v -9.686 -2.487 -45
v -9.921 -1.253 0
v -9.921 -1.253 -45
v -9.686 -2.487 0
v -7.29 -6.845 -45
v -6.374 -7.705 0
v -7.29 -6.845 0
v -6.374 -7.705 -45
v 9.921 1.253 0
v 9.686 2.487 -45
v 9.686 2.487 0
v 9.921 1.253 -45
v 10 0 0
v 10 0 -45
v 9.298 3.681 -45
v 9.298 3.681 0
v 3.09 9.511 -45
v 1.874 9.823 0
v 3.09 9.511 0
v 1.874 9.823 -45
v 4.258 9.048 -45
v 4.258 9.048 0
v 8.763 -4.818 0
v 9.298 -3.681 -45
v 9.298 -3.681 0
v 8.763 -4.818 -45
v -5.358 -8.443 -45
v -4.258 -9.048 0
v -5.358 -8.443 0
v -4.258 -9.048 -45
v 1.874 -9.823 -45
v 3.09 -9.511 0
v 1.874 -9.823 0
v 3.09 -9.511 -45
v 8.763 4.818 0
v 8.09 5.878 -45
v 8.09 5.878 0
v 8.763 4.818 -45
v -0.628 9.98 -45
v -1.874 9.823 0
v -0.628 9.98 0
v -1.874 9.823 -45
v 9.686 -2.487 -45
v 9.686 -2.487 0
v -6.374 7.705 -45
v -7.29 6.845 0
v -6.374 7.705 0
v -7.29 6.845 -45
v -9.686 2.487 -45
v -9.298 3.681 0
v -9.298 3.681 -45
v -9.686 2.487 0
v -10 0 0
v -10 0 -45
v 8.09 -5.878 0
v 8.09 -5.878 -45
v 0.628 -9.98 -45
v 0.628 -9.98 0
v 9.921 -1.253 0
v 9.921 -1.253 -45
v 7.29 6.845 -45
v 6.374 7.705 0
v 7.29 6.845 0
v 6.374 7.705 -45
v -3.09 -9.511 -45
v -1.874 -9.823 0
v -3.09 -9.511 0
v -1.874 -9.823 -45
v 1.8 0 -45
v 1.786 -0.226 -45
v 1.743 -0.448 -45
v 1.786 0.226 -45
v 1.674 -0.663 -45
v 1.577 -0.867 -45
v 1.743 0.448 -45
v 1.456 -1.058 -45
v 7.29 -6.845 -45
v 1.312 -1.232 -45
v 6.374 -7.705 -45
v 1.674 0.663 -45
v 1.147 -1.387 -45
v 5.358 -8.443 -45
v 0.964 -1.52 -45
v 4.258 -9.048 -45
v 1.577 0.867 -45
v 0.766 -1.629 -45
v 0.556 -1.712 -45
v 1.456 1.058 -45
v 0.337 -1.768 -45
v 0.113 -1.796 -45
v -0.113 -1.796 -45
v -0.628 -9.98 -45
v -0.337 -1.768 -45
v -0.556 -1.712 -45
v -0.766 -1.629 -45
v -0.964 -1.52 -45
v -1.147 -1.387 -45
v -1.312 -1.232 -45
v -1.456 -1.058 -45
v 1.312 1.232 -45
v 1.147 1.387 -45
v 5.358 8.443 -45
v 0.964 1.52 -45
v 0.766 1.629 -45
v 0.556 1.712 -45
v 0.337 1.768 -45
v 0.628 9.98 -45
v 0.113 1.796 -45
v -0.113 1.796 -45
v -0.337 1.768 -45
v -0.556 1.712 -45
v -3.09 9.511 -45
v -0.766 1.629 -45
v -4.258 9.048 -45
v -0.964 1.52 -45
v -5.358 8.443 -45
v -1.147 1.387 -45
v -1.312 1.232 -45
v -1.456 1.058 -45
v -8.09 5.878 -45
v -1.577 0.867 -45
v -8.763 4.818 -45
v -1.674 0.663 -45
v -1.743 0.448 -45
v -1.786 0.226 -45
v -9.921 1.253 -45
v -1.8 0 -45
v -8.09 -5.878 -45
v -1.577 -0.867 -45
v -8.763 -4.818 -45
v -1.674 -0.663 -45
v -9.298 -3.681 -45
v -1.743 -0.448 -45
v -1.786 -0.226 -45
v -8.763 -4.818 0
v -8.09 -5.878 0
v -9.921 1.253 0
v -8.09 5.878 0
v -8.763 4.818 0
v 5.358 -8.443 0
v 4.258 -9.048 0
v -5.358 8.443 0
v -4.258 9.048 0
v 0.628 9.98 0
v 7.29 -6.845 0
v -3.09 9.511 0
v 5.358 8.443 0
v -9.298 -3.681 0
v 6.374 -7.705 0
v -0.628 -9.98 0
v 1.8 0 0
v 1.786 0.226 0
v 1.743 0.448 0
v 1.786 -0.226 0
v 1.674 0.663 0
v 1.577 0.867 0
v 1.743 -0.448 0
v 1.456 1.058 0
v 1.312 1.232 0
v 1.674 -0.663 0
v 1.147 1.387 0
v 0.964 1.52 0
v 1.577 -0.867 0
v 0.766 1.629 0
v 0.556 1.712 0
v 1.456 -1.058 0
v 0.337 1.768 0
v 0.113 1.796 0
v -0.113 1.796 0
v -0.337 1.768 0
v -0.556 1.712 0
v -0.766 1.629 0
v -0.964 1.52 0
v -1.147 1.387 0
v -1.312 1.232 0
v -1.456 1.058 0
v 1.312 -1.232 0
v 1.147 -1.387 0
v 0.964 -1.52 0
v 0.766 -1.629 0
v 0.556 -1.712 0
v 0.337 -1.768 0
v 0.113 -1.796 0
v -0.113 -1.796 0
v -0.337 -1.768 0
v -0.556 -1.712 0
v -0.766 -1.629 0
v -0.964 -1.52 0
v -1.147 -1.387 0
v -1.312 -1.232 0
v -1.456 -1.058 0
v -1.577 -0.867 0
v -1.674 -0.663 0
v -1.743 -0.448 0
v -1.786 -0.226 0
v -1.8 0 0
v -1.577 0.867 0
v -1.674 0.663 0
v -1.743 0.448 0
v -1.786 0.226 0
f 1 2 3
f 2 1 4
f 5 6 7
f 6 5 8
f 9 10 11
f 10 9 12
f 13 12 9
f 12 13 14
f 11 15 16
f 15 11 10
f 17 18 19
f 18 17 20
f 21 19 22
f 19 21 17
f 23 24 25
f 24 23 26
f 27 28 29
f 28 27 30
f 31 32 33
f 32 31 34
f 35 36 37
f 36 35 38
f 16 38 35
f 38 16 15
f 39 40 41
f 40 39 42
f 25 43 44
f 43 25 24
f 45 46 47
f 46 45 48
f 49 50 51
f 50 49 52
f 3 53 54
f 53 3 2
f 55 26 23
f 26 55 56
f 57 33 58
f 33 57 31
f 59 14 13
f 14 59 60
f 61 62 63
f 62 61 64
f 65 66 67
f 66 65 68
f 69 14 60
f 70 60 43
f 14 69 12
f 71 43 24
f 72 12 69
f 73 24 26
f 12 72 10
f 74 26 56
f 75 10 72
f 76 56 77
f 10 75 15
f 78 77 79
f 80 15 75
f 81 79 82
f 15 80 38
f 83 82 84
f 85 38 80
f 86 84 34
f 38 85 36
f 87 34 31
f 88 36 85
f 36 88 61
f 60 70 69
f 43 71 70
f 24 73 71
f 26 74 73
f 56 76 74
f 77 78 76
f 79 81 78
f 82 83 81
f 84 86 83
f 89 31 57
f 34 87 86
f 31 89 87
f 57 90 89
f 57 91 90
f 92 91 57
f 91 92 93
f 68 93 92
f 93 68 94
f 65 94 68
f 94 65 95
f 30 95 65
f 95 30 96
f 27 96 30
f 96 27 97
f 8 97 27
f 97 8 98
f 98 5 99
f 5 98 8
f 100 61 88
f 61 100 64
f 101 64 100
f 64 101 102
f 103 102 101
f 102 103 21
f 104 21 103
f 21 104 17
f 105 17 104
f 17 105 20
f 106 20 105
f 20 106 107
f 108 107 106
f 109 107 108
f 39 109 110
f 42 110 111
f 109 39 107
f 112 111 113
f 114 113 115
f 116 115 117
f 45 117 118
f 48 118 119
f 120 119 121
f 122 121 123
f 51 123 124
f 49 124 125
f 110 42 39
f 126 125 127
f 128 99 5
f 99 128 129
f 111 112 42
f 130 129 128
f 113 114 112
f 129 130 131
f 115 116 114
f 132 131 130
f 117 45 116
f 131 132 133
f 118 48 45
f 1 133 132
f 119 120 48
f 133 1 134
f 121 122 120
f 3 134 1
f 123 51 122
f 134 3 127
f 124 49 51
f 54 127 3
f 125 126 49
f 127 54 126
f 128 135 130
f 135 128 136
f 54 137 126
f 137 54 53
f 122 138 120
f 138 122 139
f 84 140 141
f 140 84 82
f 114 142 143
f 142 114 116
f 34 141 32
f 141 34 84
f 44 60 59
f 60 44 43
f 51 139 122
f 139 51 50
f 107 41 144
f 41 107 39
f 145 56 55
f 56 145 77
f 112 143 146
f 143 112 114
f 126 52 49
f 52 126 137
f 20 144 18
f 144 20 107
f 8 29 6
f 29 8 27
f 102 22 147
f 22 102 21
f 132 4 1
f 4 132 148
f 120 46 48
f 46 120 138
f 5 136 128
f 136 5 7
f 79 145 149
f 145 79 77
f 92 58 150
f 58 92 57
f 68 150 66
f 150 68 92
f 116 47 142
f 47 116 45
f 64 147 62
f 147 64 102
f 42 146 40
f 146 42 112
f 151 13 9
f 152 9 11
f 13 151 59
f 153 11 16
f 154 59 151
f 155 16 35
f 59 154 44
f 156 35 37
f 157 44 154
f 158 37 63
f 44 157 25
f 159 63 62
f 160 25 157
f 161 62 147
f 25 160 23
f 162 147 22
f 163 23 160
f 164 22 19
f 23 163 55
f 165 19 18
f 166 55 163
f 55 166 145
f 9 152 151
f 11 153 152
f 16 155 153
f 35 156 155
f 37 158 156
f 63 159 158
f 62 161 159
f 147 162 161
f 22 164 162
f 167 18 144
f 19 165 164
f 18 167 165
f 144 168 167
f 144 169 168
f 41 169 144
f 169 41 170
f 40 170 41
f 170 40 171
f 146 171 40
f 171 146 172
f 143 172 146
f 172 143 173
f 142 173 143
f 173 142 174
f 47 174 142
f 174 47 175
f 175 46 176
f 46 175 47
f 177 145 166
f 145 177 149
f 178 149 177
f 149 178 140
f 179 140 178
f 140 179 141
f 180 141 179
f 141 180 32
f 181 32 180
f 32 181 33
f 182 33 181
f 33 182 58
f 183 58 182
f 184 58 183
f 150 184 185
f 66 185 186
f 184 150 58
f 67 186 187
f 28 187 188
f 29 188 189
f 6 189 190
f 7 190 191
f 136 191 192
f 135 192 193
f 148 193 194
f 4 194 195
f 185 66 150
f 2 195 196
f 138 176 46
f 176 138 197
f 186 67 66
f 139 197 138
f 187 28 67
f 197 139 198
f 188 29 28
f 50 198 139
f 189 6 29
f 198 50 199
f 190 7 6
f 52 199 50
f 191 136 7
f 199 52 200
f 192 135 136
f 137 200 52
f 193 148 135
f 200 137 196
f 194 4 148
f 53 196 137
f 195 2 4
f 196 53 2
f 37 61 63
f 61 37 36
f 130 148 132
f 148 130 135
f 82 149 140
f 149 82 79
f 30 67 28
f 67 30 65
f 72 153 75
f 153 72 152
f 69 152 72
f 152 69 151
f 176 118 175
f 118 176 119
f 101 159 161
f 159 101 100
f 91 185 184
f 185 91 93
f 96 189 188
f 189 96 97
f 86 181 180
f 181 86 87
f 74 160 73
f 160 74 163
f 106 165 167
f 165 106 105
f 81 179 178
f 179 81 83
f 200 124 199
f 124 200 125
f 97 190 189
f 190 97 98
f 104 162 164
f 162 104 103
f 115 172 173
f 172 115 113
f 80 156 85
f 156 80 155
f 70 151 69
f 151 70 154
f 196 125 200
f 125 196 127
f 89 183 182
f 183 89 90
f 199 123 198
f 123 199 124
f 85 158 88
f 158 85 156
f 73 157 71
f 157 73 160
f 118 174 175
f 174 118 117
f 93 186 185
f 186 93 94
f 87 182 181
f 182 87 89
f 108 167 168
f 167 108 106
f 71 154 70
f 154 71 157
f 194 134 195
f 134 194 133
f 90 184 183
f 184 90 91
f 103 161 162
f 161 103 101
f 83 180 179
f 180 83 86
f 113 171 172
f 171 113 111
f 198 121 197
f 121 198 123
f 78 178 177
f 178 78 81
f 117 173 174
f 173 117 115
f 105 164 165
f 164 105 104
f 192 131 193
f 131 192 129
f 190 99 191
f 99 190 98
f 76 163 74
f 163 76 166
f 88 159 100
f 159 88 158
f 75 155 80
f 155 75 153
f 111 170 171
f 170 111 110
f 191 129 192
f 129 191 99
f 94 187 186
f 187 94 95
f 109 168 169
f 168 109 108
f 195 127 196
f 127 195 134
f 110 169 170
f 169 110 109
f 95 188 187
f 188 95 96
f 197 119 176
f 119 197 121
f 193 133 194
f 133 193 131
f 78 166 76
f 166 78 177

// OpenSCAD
$fn = 50;


difference() {
	union() {
		translate(v = [0, 0, -45.0000000000]) {
			cylinder(h = 45, r = 10.0000000000);
		}
	}
	union() {
		#translate(v = [0, 0, -45]) {
			cylinder(h = 45, r = 1.8000000000);
		}
	}
}
